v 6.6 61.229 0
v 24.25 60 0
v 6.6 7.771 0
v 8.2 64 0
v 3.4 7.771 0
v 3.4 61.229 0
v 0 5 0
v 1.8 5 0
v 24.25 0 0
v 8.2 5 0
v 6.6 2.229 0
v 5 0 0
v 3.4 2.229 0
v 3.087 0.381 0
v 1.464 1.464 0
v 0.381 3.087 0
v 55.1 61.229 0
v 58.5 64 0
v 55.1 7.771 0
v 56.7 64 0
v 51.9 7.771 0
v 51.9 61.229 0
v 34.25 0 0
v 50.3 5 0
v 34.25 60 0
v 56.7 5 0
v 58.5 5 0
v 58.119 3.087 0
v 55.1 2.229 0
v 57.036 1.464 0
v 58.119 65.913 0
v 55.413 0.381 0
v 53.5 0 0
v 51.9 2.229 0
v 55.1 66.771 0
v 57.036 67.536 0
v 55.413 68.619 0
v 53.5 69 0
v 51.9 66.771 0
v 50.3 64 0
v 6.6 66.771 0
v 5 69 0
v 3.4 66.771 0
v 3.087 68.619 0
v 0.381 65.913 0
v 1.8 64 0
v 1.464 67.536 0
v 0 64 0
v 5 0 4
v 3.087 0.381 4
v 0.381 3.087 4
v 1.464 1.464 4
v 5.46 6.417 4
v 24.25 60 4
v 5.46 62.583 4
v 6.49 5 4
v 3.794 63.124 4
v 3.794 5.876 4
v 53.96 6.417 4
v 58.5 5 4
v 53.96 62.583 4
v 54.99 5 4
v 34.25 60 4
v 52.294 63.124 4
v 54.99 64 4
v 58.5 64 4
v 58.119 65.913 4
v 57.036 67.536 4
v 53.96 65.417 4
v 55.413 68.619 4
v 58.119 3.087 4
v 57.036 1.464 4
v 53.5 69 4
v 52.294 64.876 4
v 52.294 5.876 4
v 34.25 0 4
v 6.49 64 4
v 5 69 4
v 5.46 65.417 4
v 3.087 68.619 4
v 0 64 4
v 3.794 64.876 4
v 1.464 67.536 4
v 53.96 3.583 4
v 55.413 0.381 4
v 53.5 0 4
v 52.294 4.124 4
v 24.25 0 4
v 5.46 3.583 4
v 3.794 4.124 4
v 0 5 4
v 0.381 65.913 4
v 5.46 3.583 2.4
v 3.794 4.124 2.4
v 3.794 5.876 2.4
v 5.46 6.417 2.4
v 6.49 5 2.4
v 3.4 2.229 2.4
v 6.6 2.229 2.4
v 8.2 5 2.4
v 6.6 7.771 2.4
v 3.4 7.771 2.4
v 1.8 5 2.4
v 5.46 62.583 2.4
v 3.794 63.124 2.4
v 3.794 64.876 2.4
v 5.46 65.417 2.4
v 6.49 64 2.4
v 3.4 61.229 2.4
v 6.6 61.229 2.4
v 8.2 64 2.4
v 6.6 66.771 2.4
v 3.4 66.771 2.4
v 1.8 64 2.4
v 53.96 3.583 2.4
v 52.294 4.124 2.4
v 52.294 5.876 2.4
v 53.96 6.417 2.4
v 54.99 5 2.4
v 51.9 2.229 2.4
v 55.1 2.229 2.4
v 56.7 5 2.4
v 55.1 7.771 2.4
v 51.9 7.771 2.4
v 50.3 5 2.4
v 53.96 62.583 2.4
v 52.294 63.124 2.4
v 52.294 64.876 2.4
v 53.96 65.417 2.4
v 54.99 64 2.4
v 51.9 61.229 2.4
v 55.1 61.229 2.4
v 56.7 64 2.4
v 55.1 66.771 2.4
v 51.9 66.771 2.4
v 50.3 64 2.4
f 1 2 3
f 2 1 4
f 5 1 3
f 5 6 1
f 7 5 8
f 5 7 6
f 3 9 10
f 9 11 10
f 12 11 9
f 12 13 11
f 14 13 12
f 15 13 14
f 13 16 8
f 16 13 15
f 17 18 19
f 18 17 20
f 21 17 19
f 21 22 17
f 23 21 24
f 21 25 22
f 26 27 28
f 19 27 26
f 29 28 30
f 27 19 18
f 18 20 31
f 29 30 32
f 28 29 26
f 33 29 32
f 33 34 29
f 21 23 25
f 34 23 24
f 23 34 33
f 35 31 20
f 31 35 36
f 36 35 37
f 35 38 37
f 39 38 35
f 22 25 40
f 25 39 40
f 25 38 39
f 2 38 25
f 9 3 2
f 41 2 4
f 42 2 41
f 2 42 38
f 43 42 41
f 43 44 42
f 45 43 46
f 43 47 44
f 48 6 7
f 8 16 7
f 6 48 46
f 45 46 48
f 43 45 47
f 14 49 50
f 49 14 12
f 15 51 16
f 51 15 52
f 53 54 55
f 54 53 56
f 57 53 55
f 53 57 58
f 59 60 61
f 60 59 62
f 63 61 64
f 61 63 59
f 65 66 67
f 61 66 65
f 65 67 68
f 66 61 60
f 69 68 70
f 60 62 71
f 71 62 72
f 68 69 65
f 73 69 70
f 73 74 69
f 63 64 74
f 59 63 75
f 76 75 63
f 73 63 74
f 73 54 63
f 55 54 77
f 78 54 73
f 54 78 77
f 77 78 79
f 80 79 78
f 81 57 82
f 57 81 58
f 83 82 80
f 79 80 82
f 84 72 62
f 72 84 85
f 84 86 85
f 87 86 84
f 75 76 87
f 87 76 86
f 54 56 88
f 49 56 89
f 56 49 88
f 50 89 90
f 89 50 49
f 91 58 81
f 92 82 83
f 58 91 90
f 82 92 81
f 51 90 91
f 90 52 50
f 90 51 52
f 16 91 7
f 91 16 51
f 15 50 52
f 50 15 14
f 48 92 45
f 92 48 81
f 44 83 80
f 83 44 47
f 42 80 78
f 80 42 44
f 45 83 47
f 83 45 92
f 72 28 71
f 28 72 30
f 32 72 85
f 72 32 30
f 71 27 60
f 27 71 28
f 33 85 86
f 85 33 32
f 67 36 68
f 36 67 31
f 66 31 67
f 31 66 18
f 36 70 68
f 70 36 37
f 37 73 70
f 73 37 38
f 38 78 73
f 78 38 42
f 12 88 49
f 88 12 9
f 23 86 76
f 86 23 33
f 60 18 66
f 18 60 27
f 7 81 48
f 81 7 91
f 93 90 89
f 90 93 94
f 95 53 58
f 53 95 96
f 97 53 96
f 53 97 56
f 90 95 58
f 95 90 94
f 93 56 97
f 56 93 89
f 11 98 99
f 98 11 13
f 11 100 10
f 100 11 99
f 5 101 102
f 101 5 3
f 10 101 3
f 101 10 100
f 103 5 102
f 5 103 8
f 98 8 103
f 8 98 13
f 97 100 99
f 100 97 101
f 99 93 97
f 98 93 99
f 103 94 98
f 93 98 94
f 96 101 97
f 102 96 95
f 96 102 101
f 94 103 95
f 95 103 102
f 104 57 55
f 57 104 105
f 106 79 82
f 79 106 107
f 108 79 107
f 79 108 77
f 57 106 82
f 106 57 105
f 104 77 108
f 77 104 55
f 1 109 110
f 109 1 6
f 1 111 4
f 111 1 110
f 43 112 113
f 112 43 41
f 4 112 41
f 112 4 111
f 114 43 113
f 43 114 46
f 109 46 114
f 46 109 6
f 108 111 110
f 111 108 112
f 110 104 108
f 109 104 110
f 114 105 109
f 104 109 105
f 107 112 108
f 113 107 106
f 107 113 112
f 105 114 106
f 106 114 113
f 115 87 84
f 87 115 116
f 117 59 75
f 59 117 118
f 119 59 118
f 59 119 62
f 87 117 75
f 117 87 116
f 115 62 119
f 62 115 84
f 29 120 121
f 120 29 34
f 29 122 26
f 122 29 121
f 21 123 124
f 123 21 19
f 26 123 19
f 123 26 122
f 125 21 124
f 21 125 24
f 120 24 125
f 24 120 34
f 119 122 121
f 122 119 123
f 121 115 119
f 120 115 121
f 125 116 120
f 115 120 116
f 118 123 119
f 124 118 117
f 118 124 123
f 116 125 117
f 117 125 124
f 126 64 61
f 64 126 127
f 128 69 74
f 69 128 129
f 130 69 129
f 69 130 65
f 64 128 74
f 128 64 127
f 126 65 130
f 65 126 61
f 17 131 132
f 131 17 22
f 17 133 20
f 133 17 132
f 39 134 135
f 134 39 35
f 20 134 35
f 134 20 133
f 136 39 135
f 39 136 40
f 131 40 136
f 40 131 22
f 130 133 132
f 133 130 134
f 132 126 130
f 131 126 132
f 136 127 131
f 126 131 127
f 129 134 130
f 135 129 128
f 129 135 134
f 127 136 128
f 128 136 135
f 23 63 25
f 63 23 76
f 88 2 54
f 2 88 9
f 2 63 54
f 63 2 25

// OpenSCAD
include <MCAD/nuts_and_bolts.scad>;
include <MCAD/boxes.scad>;

holes = [48.5, 59];
width = 10;
thick = 4;
bolt_size = 3;

difference() {
    translate([(holes[0]+width)/2, (holes[1]+width)/2, thick/2]) roundedBox([holes[0]+width, holes[1]+width, thick], width/2, true);
    // Bolt and nut holes
    for (i = [0, holes[0]]) {
        for (j = [0, holes[1]]) {
            translate([i + width/2, j + width/2]) {
                boltHole(bolt_size, length=thick*2);
                nutHole(bolt_size);
            }
        }
    }
    translate([holes[0]/2, 0]) cube([width, holes[1]+1, thick]);
}
